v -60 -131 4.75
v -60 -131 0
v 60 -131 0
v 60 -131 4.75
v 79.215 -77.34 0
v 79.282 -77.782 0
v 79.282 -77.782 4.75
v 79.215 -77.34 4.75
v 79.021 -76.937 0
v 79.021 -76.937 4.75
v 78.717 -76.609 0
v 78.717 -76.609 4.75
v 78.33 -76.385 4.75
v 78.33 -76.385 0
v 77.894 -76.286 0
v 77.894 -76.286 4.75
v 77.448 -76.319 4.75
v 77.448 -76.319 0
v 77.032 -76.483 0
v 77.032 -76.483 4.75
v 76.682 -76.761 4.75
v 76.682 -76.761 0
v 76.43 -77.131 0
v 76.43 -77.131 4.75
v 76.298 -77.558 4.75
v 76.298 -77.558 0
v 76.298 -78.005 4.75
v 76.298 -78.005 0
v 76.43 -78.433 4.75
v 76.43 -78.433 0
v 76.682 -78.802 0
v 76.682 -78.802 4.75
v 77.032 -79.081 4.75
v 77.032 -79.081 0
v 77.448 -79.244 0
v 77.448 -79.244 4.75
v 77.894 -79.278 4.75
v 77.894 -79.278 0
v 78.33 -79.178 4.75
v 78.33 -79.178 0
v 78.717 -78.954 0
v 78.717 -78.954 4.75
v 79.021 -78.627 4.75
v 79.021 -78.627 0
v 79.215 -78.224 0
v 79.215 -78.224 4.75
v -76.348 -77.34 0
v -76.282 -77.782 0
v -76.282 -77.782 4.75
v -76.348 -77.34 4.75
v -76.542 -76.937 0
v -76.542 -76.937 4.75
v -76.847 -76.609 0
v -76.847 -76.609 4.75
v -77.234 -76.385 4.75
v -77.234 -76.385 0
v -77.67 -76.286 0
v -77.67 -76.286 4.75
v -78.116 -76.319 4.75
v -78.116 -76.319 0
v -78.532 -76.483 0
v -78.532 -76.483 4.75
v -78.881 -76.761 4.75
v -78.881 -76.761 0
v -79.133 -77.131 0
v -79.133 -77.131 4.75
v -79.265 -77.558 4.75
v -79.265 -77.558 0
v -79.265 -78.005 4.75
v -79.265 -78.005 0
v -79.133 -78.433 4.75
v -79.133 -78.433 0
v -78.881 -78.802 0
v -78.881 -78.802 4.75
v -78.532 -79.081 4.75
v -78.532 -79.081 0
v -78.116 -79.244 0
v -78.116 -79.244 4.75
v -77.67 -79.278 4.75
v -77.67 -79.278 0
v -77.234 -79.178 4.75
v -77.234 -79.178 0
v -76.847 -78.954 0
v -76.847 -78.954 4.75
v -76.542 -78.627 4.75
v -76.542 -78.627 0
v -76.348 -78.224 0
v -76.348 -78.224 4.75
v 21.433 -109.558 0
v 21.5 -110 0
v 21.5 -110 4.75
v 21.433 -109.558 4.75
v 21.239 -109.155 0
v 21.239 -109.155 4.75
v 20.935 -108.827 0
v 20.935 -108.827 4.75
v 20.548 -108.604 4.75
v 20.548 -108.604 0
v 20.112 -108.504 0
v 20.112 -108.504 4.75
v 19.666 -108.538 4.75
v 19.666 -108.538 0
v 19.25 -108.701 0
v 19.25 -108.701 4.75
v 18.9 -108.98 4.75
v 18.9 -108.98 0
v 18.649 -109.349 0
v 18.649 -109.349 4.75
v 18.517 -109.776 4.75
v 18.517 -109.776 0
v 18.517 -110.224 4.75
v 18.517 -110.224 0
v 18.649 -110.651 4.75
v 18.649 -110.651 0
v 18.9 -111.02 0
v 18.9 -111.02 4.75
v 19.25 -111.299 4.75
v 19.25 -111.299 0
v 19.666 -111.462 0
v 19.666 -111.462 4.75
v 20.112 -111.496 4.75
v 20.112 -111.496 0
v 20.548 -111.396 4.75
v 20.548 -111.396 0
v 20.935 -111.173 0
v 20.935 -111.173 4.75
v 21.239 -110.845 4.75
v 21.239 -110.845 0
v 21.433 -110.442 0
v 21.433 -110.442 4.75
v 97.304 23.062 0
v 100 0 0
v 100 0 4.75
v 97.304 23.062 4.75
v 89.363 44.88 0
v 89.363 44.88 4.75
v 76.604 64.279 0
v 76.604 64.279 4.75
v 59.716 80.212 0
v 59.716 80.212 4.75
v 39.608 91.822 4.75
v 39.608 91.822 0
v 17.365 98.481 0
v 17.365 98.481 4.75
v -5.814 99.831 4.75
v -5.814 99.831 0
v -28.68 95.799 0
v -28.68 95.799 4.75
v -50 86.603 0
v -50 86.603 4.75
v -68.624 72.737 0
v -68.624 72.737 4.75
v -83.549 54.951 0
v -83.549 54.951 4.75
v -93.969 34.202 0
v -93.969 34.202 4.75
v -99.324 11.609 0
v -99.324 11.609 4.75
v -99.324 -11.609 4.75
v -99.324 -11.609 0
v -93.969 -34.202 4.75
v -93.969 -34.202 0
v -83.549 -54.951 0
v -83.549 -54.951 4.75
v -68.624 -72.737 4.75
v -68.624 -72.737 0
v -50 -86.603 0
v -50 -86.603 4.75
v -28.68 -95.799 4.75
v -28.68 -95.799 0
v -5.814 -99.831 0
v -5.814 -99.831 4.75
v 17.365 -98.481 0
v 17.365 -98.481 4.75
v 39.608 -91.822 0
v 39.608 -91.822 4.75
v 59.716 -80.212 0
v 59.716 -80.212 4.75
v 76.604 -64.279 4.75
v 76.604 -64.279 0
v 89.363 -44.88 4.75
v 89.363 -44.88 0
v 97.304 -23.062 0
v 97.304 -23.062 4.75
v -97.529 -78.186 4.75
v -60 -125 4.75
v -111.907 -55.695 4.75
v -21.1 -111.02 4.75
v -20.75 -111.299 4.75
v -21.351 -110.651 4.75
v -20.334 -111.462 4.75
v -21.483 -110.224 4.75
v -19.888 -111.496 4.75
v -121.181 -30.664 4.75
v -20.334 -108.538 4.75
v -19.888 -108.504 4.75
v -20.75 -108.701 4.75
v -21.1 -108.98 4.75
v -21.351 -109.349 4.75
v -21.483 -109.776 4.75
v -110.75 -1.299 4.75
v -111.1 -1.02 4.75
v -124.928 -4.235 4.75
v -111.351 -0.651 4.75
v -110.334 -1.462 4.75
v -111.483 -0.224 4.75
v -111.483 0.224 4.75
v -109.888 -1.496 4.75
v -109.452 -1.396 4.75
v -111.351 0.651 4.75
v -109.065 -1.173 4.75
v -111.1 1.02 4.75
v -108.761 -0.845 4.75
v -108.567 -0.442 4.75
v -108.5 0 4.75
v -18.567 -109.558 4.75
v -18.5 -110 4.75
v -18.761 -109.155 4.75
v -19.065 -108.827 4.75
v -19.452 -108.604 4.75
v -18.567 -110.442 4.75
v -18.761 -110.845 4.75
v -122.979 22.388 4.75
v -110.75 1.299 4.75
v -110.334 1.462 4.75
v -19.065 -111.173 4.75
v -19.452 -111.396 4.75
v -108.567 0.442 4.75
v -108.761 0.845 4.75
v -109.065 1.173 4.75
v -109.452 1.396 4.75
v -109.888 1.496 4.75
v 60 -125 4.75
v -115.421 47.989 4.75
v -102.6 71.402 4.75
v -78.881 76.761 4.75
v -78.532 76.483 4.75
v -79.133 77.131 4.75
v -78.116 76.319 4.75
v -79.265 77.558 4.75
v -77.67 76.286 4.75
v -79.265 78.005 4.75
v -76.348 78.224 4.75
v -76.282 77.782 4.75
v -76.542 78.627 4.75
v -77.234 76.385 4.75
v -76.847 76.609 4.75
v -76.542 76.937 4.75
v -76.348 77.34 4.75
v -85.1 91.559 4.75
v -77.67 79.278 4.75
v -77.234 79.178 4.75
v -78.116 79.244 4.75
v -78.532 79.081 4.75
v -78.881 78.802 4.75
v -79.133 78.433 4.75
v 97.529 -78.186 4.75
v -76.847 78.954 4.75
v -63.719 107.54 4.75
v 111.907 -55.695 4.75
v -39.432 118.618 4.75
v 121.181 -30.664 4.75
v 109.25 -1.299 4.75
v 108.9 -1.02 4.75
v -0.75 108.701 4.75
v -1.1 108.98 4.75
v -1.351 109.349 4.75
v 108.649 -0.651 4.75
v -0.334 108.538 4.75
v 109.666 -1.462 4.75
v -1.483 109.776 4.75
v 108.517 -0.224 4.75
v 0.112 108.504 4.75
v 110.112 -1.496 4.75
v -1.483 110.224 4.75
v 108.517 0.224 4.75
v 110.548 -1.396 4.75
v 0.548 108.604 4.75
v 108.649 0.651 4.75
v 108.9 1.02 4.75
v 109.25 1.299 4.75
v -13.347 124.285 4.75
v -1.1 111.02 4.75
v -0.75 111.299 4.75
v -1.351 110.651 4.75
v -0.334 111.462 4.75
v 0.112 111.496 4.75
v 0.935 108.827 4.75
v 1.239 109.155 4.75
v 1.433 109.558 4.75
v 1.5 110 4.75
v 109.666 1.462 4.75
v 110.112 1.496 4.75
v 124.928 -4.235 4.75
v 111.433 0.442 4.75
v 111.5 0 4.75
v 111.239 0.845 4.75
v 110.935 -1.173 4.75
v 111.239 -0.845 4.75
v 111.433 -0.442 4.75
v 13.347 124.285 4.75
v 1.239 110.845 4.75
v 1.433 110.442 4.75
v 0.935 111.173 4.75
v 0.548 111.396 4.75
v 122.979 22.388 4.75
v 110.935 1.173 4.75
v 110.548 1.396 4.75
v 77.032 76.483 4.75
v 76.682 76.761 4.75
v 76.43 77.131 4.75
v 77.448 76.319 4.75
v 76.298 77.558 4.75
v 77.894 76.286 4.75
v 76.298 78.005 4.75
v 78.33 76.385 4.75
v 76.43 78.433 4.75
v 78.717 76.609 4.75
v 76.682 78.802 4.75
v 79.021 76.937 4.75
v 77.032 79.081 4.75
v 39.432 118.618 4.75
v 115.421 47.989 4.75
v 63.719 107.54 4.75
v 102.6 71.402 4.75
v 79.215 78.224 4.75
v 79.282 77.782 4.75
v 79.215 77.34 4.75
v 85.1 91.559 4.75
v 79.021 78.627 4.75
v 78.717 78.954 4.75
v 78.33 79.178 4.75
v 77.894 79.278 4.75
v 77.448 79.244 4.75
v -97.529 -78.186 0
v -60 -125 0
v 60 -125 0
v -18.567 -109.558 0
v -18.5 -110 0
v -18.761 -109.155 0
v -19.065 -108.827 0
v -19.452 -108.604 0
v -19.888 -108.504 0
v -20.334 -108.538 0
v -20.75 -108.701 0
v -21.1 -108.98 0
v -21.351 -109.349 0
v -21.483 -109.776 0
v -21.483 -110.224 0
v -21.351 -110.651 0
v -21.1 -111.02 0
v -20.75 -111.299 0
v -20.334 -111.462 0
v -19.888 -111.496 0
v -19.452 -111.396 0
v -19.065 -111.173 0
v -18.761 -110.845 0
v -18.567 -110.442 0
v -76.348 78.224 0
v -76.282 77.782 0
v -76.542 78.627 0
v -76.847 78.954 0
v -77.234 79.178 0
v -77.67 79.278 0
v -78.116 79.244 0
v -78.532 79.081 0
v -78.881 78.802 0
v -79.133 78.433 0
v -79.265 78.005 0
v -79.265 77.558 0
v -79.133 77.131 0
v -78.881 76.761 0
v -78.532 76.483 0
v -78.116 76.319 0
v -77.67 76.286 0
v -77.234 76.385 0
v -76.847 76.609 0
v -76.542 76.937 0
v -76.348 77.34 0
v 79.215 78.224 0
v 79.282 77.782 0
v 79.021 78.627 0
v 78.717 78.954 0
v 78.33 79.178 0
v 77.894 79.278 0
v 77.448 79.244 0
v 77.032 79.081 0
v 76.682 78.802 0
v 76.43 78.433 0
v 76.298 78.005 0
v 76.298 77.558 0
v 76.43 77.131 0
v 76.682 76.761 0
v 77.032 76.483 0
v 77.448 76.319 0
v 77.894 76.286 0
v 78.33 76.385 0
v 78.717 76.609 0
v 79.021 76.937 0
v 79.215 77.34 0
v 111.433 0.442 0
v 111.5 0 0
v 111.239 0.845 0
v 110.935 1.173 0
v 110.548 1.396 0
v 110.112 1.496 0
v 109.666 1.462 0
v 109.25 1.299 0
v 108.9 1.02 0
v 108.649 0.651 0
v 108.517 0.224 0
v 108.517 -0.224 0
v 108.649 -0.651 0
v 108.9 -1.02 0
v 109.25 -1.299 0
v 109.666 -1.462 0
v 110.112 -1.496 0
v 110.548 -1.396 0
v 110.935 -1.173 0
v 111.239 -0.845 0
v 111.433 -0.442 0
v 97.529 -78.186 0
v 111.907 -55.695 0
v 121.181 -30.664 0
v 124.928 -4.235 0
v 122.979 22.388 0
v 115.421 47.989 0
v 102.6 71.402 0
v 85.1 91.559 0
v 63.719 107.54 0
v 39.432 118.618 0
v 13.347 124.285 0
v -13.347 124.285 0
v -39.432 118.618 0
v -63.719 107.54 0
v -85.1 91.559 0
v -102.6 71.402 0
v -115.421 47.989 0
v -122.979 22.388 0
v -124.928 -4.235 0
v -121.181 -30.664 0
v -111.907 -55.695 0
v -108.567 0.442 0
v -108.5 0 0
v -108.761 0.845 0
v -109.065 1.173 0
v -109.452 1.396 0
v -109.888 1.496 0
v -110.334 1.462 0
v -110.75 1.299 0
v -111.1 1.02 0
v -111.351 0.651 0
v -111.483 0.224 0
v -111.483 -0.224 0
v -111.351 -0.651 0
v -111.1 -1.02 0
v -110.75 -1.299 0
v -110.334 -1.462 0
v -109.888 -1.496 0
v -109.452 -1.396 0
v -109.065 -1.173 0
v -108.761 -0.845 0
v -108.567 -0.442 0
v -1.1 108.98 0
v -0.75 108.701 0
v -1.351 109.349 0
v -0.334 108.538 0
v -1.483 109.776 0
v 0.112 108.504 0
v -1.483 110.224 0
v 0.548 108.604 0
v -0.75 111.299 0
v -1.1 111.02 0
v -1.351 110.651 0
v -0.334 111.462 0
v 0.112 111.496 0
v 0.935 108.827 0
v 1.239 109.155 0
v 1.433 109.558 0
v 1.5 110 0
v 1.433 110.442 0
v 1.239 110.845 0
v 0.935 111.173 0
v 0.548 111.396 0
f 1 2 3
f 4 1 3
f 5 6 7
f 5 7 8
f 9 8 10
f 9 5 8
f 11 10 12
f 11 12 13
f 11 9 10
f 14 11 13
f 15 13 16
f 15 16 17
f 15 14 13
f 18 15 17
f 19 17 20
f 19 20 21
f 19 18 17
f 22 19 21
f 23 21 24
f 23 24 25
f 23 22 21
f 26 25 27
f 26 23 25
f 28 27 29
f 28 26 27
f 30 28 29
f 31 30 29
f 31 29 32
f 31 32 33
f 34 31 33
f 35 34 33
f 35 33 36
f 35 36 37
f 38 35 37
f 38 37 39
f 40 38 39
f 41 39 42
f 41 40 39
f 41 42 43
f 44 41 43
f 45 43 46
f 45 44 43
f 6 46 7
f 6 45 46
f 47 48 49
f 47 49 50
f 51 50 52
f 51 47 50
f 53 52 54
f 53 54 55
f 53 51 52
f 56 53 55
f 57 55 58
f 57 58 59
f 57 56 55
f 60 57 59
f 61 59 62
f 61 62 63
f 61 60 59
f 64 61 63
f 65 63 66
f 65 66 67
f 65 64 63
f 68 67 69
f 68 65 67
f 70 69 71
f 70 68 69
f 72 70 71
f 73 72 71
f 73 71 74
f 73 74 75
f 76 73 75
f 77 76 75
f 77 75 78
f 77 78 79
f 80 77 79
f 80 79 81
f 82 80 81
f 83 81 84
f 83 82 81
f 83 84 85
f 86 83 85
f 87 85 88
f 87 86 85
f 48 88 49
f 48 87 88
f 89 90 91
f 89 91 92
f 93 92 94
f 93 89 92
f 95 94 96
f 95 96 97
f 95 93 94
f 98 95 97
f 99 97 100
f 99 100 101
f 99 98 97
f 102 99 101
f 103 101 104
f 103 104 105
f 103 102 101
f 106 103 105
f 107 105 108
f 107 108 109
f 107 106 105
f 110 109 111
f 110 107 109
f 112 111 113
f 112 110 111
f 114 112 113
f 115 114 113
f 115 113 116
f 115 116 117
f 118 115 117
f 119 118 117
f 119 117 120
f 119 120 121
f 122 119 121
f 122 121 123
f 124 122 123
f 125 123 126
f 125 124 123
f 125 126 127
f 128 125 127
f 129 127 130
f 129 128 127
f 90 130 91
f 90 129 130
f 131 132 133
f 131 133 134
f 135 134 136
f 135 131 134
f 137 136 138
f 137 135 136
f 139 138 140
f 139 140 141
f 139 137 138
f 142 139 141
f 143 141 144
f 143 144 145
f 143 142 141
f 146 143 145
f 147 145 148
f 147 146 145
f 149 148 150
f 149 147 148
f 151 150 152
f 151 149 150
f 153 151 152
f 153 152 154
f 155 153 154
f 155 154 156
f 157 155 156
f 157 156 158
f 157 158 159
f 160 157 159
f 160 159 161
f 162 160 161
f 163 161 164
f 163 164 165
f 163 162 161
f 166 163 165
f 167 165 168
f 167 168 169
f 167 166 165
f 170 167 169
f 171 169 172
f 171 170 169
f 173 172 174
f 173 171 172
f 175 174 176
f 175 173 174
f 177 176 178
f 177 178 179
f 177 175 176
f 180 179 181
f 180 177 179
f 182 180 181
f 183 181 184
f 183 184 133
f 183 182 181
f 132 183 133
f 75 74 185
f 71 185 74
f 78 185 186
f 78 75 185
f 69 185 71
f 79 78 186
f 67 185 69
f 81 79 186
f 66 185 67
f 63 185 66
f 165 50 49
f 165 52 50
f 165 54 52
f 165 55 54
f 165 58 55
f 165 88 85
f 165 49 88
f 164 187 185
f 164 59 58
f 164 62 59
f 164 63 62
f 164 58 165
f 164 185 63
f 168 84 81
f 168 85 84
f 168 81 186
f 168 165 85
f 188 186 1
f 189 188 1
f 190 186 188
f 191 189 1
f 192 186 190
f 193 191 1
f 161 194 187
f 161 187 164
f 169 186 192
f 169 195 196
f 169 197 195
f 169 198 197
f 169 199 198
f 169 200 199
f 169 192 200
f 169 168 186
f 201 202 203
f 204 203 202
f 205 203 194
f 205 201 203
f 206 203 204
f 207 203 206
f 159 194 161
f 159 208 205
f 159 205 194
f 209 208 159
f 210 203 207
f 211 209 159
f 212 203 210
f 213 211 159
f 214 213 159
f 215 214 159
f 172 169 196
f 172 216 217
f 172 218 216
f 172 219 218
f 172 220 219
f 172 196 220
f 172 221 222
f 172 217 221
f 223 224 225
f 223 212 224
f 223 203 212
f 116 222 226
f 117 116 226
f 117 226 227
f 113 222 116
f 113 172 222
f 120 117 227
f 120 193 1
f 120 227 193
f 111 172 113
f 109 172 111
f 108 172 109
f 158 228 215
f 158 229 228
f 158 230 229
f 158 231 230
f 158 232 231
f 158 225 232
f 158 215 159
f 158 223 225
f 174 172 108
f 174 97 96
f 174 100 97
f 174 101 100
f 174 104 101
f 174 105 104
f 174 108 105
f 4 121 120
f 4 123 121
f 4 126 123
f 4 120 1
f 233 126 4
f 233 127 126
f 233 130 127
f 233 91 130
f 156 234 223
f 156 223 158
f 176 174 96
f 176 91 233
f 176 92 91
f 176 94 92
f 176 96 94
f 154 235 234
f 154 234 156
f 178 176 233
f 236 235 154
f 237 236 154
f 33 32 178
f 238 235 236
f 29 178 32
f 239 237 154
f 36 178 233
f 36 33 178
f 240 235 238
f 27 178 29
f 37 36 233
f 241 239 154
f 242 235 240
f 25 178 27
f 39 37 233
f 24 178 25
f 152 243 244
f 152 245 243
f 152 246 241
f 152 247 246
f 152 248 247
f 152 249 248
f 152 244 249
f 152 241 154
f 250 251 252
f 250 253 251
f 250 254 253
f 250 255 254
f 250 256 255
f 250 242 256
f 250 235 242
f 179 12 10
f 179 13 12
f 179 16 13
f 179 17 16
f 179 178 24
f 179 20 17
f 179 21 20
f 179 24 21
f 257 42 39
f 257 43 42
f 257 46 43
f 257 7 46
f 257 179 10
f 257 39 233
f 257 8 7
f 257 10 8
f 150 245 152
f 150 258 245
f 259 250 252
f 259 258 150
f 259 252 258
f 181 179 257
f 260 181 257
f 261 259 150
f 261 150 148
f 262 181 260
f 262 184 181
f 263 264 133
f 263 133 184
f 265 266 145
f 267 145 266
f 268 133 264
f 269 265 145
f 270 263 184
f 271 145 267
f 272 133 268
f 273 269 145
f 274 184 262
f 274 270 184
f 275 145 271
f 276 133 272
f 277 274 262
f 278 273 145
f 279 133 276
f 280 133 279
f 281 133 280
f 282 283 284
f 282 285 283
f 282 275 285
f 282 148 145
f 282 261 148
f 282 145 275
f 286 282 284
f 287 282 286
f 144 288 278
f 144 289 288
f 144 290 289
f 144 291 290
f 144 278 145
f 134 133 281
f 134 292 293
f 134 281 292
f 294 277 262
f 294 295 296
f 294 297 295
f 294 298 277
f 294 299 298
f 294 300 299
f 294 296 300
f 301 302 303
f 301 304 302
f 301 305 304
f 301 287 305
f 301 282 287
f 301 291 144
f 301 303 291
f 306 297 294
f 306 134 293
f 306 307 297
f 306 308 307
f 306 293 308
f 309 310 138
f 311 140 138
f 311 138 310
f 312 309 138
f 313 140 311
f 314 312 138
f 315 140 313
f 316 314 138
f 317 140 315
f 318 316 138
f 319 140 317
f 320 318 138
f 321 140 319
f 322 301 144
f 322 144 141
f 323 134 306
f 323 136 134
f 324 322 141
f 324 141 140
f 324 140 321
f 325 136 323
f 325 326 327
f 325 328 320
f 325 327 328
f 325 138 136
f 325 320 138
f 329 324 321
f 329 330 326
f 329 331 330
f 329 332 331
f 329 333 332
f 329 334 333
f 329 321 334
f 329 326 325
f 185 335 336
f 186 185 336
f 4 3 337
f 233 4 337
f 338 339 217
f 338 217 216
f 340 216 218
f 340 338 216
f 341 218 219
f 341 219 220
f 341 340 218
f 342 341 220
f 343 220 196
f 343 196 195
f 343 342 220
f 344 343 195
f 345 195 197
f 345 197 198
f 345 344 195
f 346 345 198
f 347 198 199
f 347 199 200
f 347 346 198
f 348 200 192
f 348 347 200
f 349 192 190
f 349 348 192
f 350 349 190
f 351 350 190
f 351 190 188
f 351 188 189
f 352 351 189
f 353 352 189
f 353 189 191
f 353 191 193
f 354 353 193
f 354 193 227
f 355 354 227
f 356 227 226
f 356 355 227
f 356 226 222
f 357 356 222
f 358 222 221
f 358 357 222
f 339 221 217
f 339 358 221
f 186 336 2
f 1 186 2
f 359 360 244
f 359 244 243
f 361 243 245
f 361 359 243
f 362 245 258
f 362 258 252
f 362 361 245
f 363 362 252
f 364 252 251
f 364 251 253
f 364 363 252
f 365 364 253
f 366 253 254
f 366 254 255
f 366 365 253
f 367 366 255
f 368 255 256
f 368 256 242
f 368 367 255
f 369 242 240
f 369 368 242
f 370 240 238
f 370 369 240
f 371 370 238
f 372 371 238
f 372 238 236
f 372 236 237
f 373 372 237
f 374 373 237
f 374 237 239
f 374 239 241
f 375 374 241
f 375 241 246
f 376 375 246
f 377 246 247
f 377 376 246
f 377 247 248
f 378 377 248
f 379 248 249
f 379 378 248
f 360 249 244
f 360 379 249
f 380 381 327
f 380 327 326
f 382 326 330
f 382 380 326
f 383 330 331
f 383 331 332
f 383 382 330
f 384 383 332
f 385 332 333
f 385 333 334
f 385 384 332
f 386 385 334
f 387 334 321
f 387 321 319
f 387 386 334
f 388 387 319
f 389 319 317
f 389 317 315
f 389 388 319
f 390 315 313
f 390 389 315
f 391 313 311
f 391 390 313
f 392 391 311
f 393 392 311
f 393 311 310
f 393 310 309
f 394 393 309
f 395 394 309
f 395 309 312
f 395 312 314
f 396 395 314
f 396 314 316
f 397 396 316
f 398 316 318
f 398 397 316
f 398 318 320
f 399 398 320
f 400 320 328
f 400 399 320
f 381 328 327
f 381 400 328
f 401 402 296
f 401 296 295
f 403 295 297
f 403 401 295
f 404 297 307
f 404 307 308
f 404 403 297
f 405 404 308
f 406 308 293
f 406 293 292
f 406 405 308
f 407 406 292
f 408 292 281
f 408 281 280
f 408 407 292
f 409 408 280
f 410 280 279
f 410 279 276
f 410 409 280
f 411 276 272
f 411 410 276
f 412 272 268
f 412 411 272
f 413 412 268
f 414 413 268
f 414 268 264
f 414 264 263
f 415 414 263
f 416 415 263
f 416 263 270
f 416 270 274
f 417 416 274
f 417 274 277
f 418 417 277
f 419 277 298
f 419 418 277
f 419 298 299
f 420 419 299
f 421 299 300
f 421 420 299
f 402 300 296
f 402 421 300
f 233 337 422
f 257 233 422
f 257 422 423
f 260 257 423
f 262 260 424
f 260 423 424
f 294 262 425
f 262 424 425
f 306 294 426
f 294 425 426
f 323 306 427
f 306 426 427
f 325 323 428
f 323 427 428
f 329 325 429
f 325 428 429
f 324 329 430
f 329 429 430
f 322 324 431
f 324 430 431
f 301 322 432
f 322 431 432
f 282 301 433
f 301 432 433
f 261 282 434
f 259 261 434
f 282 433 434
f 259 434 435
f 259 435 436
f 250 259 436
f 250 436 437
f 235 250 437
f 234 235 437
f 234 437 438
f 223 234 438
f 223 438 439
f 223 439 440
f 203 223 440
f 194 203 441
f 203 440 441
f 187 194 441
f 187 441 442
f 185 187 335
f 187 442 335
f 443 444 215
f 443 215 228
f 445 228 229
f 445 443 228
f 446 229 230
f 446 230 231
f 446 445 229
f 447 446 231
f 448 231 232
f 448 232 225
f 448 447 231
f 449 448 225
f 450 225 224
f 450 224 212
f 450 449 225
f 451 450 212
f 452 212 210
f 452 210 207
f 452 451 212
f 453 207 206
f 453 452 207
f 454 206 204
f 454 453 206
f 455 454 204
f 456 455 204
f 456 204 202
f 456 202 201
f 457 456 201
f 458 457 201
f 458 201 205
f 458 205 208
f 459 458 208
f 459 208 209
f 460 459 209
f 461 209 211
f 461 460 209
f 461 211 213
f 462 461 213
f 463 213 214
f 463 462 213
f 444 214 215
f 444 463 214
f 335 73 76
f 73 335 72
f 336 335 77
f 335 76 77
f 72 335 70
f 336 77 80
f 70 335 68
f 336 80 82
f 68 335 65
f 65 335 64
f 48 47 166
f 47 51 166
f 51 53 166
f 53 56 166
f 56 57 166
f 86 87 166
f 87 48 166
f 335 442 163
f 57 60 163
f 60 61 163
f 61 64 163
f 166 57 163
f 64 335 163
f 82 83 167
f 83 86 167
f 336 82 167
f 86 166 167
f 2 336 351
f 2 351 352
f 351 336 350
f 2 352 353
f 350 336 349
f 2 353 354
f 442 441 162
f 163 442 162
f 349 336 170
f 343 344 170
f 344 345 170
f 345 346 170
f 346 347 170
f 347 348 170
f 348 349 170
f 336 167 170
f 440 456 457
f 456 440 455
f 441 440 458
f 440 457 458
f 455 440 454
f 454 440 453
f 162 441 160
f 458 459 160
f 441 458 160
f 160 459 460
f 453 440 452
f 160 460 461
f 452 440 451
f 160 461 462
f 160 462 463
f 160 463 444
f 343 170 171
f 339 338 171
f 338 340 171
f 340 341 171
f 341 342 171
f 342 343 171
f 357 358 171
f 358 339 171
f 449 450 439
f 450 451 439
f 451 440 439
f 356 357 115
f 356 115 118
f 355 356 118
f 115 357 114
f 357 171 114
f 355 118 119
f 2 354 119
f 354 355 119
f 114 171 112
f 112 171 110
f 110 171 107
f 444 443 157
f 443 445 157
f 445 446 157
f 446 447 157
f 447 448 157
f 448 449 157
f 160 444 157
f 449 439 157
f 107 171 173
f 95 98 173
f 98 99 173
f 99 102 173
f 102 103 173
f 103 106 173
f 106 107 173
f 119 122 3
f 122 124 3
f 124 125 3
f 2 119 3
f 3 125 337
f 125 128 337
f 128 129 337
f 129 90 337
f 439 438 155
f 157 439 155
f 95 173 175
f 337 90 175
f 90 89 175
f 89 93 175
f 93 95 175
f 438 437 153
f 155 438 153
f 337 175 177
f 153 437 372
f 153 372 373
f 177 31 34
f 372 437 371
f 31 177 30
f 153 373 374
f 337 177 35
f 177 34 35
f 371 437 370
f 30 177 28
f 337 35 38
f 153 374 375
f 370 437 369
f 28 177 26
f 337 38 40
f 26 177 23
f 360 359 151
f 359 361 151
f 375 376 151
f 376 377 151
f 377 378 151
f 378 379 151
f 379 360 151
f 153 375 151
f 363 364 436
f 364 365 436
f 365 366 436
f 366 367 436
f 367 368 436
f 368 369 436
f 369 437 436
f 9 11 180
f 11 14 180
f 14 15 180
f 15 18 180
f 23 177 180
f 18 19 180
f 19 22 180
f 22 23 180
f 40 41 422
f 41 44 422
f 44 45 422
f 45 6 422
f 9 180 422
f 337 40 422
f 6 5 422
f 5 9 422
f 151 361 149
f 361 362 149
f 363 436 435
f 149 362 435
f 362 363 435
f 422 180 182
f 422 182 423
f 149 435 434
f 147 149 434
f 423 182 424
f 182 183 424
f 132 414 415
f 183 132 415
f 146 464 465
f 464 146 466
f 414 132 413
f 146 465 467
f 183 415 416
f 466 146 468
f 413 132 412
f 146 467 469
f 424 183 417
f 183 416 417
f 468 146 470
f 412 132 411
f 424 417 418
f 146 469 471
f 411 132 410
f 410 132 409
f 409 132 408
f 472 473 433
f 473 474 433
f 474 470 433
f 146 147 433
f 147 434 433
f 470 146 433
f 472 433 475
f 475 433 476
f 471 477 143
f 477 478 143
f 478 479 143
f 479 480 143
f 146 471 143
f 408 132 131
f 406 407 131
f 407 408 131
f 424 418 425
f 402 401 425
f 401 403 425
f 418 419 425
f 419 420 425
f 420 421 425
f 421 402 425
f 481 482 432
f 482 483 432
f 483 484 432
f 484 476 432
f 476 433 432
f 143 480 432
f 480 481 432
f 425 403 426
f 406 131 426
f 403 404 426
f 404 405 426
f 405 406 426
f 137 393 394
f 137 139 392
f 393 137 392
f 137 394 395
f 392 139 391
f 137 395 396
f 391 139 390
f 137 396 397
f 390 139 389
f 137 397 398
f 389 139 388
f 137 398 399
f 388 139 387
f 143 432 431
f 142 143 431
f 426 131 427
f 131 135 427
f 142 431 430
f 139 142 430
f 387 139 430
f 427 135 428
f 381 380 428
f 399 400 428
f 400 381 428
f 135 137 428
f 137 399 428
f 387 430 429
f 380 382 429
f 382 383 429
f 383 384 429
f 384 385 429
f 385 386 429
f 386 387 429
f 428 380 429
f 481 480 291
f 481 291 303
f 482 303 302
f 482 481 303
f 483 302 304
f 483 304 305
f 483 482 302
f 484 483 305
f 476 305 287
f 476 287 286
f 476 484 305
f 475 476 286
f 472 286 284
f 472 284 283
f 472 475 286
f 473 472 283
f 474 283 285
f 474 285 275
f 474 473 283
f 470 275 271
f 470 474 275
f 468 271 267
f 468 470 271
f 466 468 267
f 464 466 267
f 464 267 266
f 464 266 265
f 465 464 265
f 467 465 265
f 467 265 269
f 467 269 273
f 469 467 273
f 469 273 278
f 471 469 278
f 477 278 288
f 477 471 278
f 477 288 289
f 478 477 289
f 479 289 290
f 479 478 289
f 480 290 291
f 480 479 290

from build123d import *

# Parameters (mm, degrees)
SKETCH1_R           = 1.5
SKETCH1_R_2         = 100
BOSS_EXTRUDE1_DEPTH = 4.75


with BuildPart() as part:
    # Sketch1 → Boss-Extrude1 (new body)
    with BuildSketch(Plane.XY):
        with BuildLine():
            Line((-97.529258777, -78.185955788), (-60, -125.000000002))
            Line((-60, -125.000000002), (-60, -131.000000002))
            Line((-60, -131.000000002), (60, -131.000000002))
            Line((60, -131.000000002), (60, -125.000000002))
            Line((60, -125.000000002), (97.529258777, -78.185955788))
            ThreePointArc((97.529258777, -78.185955788), (0, 125), (-97.529258777, -78.185955788))
        make_face()
        with Locations((-77.781745931, -77.781745931)):
            Circle(SKETCH1_R, mode=Mode.SUBTRACT)
        with Locations((-20, -110)):
            Circle(SKETCH1_R, mode=Mode.SUBTRACT)
        with Locations((20, -110)):
            Circle(SKETCH1_R, mode=Mode.SUBTRACT)
        with Locations((77.781745931, -77.781745931)):
            Circle(SKETCH1_R, mode=Mode.SUBTRACT)
        with Locations((-110, 0)):
            Circle(SKETCH1_R, mode=Mode.SUBTRACT)
        with Locations((-77.781745931, 77.781745931)):
            Circle(SKETCH1_R, mode=Mode.SUBTRACT)
        Circle(SKETCH1_R_2, mode=Mode.SUBTRACT)
        with Locations((110, 0)):
            Circle(SKETCH1_R, mode=Mode.SUBTRACT)
        with Locations((0, 110)):
            Circle(SKETCH1_R, mode=Mode.SUBTRACT)
        with Locations((77.781745931, 77.781745931)):
            Circle(SKETCH1_R, mode=Mode.SUBTRACT)
    extrude(amount=BOSS_EXTRUDE1_DEPTH)


solid = part.part
